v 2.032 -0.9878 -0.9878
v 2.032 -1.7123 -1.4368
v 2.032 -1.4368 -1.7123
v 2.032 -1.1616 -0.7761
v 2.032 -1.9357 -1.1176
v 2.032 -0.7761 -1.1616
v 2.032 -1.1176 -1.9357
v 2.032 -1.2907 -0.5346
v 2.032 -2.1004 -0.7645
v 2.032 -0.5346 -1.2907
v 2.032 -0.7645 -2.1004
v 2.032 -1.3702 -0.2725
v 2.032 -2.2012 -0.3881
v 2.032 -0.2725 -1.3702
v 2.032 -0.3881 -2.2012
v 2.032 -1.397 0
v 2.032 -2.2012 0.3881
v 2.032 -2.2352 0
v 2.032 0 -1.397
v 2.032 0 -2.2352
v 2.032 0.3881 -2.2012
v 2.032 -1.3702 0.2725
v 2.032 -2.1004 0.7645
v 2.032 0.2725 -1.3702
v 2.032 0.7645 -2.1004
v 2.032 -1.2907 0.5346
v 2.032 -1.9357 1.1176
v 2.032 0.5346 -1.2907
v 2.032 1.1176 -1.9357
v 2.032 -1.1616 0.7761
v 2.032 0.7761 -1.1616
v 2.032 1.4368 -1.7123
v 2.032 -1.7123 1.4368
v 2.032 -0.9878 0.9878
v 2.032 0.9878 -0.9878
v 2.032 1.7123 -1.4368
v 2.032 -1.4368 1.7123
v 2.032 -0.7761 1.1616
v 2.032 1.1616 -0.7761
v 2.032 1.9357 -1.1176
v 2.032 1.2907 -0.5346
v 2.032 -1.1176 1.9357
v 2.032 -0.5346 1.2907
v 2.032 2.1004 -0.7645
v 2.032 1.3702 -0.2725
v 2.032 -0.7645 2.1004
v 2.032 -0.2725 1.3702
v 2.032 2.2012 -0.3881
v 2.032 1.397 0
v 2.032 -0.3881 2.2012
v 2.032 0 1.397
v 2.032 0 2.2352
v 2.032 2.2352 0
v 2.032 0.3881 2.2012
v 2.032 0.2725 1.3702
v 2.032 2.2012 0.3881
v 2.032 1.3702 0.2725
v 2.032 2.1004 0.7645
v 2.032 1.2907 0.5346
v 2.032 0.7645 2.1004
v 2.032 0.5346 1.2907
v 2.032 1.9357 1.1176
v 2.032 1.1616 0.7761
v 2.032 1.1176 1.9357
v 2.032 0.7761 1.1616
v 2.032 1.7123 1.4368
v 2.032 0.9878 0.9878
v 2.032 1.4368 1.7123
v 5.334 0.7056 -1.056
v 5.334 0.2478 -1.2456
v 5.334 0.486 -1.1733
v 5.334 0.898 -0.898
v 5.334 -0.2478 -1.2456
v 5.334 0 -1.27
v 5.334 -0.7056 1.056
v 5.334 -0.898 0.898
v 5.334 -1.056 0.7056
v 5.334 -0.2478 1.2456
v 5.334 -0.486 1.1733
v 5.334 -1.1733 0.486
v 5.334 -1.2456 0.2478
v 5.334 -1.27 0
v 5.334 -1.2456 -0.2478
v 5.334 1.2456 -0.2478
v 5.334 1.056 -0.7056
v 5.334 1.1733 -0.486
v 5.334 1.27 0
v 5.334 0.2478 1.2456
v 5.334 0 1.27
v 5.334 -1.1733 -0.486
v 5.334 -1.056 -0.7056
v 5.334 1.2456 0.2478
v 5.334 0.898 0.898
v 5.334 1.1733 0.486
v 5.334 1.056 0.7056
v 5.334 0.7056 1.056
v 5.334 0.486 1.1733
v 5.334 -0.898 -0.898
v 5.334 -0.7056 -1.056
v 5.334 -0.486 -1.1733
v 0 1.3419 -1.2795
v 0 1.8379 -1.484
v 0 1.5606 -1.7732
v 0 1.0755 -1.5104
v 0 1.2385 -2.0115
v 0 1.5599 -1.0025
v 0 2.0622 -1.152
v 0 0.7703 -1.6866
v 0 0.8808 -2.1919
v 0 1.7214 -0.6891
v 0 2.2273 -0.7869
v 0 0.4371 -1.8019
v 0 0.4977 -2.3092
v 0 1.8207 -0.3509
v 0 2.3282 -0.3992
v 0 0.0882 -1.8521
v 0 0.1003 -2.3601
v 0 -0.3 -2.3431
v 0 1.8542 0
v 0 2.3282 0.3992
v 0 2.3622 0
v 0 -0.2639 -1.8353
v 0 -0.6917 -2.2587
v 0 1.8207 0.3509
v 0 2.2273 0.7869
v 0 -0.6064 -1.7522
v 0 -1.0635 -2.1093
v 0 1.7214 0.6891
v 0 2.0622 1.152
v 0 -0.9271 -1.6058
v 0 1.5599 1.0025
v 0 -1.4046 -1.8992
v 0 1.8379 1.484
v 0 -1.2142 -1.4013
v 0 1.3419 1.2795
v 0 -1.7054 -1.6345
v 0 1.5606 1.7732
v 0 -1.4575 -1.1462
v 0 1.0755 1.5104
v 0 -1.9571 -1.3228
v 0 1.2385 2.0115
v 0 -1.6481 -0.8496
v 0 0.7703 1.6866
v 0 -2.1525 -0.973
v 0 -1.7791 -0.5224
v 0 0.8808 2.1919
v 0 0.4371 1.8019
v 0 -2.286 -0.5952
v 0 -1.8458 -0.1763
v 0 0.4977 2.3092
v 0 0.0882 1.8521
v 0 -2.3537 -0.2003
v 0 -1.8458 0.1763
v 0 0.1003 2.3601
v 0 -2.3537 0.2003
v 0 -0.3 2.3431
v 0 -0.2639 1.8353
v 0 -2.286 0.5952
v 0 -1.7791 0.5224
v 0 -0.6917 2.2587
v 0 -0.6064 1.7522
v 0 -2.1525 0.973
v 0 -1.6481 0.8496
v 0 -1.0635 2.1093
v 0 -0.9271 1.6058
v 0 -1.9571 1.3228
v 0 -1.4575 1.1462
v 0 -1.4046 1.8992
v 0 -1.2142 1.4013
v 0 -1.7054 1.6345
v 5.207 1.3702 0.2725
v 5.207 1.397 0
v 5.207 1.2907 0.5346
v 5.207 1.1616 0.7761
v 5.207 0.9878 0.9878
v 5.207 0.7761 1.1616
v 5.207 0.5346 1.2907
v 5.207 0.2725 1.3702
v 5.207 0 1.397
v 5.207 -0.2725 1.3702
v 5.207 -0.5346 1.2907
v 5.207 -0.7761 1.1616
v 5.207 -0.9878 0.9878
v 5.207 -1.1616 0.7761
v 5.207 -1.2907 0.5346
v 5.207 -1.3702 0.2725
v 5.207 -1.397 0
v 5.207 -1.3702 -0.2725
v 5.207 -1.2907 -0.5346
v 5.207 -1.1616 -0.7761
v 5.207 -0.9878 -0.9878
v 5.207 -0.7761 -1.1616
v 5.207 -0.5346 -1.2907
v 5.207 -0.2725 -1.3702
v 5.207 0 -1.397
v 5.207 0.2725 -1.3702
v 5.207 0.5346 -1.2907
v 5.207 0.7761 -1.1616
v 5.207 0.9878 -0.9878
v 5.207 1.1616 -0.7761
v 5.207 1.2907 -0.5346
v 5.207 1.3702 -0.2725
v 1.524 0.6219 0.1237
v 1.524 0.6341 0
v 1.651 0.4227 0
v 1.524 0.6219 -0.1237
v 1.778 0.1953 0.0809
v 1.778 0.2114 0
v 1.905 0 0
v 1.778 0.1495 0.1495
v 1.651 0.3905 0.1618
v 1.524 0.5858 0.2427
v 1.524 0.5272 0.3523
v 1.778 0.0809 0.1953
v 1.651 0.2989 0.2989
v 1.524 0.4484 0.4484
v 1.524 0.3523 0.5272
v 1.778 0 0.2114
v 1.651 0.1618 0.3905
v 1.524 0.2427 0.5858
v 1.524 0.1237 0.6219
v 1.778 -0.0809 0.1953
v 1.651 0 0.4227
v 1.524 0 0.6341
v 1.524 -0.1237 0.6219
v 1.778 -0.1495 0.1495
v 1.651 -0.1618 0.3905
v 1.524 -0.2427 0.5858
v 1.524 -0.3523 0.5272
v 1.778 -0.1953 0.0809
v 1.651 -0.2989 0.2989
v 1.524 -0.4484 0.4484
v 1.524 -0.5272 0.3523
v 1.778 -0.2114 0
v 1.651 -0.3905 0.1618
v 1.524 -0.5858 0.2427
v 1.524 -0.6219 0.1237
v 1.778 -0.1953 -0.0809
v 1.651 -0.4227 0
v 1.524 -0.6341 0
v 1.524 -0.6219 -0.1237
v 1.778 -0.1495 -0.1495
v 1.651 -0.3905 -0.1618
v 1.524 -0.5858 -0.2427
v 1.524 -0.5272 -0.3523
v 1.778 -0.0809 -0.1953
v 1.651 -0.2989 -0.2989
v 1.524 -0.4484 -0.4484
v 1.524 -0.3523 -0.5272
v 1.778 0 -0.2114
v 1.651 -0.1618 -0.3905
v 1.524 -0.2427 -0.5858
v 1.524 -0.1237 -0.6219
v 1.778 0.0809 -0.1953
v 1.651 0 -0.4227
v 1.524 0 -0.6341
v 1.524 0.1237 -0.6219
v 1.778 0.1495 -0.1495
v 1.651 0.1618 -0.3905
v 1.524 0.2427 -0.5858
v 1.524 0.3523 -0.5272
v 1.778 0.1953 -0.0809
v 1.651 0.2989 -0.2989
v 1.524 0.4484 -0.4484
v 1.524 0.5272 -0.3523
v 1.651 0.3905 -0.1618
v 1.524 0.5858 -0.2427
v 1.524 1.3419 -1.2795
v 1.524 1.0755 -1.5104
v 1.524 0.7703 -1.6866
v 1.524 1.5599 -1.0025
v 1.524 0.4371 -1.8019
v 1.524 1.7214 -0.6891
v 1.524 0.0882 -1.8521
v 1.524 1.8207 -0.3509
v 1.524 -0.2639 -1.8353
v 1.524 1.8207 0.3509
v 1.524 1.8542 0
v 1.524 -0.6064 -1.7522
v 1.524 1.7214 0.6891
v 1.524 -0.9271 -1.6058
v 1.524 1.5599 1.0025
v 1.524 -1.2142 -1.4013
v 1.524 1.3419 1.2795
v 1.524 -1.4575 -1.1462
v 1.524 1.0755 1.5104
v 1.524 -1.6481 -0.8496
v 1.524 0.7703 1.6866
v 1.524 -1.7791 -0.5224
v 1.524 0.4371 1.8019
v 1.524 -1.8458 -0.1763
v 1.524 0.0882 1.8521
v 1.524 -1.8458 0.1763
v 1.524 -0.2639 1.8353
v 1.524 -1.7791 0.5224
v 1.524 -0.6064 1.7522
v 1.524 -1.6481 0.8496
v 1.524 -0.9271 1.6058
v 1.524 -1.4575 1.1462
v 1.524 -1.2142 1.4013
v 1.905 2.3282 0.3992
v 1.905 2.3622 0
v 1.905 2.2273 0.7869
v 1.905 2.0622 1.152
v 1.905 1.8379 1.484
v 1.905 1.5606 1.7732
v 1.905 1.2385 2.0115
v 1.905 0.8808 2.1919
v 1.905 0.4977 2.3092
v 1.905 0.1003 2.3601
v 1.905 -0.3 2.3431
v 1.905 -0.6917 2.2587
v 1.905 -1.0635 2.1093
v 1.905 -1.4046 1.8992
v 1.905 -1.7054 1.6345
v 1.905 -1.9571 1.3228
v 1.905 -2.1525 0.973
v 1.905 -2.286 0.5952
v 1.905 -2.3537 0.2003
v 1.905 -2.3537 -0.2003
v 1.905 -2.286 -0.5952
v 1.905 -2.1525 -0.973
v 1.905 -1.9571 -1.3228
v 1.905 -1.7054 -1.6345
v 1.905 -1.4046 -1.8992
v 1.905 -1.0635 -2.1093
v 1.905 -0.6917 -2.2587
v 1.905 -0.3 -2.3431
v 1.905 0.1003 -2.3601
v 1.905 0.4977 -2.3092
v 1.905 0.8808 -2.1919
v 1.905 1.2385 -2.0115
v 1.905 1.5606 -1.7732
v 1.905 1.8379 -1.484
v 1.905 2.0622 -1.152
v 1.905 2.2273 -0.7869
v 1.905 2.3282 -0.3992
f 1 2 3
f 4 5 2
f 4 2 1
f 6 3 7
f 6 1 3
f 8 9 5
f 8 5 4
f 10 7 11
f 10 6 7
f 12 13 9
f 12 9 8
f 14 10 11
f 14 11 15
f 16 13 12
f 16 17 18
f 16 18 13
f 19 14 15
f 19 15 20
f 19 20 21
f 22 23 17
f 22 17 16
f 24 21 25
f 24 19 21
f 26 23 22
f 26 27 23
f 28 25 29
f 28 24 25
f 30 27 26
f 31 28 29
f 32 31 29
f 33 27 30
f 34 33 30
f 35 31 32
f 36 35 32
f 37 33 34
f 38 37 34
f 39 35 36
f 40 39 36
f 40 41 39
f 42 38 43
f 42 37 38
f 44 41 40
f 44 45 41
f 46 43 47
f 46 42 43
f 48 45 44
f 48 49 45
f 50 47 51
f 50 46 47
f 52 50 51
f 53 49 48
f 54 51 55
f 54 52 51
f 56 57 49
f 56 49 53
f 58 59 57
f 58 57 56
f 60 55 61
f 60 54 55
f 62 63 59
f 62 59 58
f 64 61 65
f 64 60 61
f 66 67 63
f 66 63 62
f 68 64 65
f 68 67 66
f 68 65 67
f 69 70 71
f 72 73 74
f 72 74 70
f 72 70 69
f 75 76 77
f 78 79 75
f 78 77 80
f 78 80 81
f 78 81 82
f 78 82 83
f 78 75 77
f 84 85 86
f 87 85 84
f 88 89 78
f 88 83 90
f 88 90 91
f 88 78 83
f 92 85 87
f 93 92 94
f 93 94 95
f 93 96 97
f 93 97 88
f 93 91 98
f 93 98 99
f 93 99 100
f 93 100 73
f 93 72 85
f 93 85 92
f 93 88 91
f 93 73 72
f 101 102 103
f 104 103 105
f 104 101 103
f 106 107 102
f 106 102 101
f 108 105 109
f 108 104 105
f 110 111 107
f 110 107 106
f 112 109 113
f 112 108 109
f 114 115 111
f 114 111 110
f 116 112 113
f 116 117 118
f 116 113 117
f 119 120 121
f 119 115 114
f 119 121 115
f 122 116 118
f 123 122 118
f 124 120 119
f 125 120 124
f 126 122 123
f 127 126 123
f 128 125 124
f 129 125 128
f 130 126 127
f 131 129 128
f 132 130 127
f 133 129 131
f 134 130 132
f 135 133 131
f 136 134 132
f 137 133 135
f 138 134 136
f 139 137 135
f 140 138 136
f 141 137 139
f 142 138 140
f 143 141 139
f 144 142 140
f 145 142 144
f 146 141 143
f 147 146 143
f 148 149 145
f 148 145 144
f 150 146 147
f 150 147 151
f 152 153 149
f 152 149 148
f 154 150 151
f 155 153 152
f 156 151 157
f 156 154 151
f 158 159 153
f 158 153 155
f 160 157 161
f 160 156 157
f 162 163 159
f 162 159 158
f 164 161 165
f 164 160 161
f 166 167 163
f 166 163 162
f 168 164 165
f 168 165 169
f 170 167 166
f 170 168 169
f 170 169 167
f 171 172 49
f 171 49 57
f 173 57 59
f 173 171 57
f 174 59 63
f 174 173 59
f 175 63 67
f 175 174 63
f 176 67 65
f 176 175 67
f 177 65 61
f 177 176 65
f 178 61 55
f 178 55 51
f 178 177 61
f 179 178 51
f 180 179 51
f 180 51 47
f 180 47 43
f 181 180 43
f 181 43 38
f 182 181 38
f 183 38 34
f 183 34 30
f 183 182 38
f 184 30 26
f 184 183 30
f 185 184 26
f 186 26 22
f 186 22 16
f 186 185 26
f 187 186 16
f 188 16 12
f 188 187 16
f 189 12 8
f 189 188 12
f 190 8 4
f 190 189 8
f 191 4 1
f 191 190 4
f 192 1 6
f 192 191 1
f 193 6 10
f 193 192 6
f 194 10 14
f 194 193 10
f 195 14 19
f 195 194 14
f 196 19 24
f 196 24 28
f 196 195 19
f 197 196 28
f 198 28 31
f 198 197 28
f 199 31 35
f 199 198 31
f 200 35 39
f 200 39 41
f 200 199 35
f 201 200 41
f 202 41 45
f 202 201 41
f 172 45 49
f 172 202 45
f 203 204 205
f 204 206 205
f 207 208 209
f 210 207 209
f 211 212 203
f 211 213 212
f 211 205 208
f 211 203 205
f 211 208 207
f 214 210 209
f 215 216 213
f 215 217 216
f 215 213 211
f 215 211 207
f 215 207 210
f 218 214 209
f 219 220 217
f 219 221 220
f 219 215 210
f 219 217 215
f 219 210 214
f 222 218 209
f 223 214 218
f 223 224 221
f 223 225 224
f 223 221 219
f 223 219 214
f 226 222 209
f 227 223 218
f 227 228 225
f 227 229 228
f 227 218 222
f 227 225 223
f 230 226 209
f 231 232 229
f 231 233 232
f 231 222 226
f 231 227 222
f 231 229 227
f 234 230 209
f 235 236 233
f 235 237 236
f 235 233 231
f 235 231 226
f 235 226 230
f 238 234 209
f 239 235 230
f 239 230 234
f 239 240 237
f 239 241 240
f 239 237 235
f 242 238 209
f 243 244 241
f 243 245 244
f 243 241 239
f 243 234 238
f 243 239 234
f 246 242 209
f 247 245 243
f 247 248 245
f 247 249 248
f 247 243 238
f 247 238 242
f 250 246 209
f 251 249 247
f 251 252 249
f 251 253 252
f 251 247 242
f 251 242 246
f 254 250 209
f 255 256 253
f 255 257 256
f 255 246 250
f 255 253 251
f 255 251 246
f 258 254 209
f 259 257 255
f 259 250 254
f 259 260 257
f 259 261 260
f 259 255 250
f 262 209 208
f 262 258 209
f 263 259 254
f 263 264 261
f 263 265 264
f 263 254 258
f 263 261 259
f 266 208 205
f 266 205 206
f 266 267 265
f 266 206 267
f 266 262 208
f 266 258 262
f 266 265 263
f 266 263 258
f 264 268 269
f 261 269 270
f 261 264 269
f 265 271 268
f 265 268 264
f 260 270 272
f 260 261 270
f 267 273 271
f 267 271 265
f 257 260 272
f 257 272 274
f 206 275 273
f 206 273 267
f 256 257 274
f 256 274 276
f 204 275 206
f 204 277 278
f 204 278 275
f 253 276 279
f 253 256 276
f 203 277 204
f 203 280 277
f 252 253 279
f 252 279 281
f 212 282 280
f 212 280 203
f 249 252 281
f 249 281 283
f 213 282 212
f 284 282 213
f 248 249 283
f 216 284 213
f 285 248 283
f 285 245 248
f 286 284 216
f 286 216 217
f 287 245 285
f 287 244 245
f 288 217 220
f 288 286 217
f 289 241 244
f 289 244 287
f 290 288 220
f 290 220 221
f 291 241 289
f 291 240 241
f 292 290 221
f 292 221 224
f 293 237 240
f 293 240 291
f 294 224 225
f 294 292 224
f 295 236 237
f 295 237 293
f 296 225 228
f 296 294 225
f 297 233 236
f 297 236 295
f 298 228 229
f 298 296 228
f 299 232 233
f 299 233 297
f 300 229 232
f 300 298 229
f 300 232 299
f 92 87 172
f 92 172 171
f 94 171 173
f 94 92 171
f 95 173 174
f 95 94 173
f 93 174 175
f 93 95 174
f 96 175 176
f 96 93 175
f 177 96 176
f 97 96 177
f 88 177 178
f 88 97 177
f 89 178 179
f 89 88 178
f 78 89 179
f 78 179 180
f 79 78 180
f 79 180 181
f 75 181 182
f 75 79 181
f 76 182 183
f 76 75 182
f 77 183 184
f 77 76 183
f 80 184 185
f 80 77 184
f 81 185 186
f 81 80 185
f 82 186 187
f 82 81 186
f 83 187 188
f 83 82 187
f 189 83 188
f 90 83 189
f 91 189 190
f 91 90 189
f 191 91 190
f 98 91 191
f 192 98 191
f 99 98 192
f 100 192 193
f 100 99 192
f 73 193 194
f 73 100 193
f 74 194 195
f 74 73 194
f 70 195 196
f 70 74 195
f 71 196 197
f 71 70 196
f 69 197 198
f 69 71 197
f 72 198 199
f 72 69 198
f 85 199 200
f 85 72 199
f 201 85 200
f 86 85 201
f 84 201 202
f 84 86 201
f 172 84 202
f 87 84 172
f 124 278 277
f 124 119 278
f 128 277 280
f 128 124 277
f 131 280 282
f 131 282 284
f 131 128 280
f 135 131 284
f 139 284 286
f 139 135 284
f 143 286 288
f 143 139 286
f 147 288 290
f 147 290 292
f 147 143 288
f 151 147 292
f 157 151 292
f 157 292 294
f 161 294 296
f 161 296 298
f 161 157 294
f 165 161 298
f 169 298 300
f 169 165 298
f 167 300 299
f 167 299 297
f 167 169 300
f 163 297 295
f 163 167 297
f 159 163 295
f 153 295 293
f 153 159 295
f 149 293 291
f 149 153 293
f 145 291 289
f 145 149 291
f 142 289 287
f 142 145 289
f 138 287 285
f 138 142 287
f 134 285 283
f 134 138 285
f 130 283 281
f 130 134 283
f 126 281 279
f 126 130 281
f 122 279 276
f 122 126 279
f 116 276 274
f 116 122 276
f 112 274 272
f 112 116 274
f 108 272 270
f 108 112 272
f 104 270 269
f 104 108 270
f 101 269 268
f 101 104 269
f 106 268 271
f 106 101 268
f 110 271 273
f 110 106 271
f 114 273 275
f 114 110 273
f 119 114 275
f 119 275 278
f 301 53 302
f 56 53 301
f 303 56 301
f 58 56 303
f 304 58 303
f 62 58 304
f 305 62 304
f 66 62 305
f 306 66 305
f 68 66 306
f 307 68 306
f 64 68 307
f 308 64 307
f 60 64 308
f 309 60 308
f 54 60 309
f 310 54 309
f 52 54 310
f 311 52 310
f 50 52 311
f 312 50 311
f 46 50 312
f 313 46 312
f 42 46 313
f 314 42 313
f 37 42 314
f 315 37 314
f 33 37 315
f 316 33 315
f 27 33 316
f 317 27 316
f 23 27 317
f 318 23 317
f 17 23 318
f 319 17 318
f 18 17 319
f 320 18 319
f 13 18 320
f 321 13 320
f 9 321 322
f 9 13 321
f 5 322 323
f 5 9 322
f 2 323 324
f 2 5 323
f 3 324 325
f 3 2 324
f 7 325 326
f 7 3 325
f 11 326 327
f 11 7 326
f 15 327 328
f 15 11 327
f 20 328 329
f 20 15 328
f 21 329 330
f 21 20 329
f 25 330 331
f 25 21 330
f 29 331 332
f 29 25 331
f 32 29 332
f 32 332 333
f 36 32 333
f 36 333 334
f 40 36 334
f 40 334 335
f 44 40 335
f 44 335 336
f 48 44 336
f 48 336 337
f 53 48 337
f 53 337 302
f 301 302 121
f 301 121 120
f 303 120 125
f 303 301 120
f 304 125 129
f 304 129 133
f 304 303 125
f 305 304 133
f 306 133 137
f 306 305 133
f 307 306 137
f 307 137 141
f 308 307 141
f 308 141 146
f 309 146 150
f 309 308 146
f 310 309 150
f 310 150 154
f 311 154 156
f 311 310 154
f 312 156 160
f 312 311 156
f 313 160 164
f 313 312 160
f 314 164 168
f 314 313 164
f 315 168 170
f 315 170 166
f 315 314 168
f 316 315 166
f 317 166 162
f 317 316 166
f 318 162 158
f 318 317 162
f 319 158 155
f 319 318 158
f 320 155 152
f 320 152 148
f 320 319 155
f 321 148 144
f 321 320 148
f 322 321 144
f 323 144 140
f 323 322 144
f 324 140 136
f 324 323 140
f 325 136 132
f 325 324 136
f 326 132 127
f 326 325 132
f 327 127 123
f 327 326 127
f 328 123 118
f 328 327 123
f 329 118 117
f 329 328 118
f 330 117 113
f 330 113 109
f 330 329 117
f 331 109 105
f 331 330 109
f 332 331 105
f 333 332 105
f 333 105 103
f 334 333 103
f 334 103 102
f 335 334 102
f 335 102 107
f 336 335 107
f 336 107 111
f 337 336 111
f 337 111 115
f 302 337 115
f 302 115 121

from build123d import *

# Parameters (mm, degrees)
CHAMFER1_SIZE = 0.127


with BuildPart() as part:
    # Sketch1 → Revolve1 (revolve)
    with BuildSketch(Plane.XY):
        Polygon((0, 1.8542), (0, 2.3622), (2.032, 2.3622), (2.032, 1.397), (5.334, 1.397), (5.334, 0), (1.905, 0), (1.524, 0.634090483), (1.524, 1.8542), align=None)
    revolve(axis=Axis((0, 0, 0), (1, 0, 0)))

    # Chamfer1
    chamfer1_edges = [part.edges().sort_by_distance(p)[0] for p in [
        (2.032, -2.3622, 0),
        (5.334, -1.397, 0),
    ]]
    chamfer(chamfer1_edges, length=CHAMFER1_SIZE)


solid = part.part
